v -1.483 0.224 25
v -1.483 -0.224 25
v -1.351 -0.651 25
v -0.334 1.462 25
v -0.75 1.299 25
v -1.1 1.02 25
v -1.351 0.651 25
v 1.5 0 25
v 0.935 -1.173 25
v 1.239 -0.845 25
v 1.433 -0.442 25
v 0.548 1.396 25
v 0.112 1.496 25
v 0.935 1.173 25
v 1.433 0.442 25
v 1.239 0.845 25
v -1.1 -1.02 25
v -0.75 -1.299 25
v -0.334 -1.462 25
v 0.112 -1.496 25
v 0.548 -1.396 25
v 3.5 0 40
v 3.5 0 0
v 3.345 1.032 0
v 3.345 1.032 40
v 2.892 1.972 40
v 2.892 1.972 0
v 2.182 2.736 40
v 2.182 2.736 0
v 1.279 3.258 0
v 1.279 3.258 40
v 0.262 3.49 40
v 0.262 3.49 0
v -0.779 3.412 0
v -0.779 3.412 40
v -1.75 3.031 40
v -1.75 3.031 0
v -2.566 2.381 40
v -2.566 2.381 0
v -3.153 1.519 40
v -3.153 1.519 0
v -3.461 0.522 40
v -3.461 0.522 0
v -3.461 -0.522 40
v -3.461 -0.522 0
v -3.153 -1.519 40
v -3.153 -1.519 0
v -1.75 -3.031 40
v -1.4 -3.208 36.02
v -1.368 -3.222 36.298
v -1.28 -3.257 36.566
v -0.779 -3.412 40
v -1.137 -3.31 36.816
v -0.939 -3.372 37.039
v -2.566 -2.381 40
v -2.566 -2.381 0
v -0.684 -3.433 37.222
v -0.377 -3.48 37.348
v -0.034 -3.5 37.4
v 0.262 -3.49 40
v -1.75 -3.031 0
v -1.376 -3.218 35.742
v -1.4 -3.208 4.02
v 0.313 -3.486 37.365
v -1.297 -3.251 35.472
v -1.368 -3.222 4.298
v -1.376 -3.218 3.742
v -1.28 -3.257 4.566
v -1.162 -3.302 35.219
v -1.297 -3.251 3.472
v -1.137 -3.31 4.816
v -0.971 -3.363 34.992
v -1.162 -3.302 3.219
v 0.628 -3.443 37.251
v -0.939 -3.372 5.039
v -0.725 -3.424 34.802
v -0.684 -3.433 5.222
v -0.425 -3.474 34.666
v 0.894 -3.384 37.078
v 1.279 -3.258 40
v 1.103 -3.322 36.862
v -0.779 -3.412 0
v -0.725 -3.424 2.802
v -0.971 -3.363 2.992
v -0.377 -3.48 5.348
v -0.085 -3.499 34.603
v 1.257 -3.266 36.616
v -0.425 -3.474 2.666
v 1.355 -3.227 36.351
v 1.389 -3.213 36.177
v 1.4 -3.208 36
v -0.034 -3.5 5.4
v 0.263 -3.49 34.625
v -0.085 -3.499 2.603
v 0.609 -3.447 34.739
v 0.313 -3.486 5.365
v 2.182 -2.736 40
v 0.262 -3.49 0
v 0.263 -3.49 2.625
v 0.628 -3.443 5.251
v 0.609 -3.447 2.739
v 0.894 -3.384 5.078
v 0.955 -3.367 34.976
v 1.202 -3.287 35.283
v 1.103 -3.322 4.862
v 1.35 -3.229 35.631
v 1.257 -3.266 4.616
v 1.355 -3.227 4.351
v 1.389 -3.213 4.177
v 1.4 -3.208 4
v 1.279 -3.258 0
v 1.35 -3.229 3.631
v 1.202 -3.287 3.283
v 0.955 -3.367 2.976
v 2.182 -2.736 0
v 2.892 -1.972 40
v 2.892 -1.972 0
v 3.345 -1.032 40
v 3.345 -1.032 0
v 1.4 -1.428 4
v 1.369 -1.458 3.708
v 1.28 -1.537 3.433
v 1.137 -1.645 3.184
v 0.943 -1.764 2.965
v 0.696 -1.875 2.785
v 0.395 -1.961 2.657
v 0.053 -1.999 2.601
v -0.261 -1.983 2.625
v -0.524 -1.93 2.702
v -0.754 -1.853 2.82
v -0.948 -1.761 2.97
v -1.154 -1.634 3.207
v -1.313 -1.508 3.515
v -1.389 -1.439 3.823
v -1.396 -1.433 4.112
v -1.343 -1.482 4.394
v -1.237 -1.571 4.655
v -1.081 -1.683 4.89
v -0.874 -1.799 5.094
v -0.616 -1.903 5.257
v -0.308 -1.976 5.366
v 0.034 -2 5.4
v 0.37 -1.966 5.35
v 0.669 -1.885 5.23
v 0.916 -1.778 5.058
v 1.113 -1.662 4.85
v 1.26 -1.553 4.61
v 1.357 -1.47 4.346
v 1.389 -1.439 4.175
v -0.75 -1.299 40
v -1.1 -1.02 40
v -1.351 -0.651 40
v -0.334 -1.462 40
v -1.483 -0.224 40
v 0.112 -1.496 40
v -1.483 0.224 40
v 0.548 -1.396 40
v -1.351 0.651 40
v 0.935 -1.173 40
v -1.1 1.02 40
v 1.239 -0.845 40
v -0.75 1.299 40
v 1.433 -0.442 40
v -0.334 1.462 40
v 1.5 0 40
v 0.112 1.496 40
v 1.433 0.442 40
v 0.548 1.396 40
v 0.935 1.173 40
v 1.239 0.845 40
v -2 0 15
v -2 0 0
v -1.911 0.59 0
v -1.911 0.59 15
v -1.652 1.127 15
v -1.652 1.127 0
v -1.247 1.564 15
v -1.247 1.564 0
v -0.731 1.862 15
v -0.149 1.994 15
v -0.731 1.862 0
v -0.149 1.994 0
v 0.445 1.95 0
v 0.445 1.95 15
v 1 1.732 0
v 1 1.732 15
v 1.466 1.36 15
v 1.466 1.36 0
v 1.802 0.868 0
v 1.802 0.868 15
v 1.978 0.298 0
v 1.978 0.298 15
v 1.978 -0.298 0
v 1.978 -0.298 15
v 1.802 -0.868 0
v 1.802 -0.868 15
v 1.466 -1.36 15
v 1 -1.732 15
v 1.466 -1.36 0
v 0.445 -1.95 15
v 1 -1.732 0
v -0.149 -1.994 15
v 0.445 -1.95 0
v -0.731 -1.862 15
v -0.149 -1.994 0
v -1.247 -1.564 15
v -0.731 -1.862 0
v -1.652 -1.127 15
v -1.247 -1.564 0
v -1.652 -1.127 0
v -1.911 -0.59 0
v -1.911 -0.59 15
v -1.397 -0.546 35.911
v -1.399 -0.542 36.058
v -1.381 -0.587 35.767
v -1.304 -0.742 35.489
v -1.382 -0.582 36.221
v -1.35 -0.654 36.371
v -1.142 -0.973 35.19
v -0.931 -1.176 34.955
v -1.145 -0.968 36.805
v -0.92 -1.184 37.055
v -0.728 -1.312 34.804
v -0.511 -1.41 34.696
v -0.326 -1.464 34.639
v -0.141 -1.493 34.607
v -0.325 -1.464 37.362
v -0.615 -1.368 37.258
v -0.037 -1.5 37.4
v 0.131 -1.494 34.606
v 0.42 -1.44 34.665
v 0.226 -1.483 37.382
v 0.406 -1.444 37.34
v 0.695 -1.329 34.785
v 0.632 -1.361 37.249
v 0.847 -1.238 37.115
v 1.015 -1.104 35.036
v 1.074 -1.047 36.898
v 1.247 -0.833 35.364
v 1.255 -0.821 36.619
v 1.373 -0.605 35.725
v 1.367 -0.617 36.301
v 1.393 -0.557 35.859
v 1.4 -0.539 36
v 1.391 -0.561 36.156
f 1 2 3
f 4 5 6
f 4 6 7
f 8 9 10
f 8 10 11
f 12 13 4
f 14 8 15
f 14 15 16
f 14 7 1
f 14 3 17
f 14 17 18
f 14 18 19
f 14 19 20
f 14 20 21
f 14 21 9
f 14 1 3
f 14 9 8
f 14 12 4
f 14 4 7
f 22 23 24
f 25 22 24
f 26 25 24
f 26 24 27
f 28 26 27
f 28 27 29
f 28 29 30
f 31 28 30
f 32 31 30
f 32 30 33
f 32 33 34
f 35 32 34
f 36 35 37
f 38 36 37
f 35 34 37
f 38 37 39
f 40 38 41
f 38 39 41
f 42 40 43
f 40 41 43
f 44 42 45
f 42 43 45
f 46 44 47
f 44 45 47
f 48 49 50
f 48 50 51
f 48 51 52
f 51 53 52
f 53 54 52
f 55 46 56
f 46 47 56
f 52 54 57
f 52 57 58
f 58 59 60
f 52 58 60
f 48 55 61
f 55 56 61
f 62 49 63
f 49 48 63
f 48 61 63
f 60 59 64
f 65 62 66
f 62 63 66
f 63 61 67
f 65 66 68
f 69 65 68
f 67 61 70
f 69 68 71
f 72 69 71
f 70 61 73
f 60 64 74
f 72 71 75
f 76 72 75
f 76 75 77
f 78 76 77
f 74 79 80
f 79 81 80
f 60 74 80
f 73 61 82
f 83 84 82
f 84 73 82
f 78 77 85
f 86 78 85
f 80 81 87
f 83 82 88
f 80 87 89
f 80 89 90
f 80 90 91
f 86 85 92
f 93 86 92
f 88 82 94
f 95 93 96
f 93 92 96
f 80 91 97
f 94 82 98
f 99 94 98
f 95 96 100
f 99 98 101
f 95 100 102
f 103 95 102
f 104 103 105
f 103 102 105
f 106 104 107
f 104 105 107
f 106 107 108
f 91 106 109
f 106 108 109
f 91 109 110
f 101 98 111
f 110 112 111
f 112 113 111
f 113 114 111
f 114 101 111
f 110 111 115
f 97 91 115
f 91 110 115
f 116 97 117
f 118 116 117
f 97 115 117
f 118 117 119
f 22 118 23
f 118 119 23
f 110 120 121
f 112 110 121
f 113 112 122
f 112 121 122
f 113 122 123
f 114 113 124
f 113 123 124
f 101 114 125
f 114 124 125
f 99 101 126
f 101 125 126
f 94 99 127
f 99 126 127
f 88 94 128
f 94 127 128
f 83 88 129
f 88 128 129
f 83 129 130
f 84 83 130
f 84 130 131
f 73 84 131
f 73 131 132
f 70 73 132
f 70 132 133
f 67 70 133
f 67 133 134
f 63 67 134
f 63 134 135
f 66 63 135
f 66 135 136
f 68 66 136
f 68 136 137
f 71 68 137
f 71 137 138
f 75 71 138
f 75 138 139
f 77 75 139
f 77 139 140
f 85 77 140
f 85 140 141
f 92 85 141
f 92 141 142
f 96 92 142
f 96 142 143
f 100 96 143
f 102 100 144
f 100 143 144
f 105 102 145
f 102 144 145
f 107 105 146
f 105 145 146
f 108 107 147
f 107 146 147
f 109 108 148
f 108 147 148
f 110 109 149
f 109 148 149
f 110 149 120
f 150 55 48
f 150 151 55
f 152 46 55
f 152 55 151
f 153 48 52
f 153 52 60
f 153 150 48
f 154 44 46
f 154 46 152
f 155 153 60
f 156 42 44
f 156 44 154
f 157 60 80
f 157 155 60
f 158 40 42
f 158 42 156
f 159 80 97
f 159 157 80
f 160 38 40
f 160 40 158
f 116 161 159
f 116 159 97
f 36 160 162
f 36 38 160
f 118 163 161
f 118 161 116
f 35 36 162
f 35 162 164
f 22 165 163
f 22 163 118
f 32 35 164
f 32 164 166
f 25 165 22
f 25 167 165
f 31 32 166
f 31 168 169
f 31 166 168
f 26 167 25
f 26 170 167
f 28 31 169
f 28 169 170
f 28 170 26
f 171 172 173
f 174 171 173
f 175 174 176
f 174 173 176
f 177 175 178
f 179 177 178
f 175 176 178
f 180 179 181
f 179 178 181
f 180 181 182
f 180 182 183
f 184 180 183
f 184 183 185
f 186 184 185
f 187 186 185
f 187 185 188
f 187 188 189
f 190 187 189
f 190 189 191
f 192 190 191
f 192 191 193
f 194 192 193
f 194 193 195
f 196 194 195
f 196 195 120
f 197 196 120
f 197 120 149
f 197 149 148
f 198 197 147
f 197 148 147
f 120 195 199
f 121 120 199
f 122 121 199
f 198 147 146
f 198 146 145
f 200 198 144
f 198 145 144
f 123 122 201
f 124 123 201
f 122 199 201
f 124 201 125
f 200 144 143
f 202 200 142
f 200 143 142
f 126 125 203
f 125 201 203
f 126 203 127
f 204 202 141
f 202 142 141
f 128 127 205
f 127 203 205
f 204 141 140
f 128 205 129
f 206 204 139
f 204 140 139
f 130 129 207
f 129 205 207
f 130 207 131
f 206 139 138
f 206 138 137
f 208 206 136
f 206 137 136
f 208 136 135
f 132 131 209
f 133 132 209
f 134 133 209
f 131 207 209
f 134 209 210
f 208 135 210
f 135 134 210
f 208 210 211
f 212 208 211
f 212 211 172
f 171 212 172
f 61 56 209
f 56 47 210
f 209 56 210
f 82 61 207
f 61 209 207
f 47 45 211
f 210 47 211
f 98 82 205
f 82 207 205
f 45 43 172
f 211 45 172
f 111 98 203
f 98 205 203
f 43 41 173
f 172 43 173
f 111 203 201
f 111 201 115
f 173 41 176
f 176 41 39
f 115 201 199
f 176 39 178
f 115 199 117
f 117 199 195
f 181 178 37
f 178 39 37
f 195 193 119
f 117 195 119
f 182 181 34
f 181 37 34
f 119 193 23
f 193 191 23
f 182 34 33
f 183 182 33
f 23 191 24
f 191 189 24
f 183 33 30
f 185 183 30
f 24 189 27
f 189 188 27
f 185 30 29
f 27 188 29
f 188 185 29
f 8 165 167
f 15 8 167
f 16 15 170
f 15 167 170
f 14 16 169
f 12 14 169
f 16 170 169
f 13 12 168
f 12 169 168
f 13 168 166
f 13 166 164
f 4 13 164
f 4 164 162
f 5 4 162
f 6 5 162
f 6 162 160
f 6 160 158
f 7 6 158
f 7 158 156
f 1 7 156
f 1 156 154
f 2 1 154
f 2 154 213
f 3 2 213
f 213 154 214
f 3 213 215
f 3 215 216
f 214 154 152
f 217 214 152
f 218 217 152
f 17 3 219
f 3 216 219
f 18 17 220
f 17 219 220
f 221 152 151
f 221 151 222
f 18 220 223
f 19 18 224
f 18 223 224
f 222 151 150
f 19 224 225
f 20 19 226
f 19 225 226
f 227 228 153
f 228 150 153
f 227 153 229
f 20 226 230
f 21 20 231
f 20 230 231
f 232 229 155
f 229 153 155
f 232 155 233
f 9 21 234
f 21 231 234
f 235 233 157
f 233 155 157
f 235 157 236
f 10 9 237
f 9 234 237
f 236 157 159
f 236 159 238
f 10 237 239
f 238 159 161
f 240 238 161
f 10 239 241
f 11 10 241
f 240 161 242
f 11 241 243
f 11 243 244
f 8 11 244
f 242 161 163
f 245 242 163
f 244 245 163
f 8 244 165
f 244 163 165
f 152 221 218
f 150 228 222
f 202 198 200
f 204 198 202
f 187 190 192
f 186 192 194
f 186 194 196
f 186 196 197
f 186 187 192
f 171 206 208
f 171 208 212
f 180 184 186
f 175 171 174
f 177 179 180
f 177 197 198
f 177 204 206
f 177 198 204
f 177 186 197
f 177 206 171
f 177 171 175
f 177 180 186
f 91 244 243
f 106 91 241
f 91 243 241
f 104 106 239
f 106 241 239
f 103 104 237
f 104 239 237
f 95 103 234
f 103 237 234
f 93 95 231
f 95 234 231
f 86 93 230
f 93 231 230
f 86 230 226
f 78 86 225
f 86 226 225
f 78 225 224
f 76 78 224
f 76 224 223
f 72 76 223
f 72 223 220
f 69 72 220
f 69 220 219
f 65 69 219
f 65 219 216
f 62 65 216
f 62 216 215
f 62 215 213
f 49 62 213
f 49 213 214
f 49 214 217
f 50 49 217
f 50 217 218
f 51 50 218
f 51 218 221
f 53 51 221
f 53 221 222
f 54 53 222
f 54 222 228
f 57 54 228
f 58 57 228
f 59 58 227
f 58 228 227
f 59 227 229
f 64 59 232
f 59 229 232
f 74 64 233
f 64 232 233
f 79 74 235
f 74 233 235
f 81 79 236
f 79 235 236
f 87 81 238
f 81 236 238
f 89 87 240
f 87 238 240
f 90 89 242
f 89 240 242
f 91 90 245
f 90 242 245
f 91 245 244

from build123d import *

# Parameters (mm, degrees)
CROQUIS1_R              = 3.5
SALIENTE_EXTRUIR1_DEPTH = 40
CROQUIS2_R              = 1.5
CORTAR_EXTRUIR1_DEPTH   = 15
CROQUIS3_R              = 2
CORTAR_EXTRUIR2_DEPTH   = 15
CROQUIS4_R              = 1.4
CORTAR_EXTRUIR3_DEPTH   = 4.5


with BuildPart() as part:
    # Croquis1 → Saliente-Extruir1 (new body)
    with BuildSketch(Plane.XY):
        Circle(CROQUIS1_R)
    extrude(amount=SALIENTE_EXTRUIR1_DEPTH)

    # Croquis2 → Cortar-Extruir1 (cut)
    with BuildSketch(Plane.XY.offset(40)):
        Circle(CROQUIS2_R)
    extrude(amount=-CORTAR_EXTRUIR1_DEPTH, mode=Mode.SUBTRACT)

    # Croquis3 → Cortar-Extruir2 (cut)
    with BuildSketch(Plane(origin=(0, 0, 0), x_dir=(-1, 0, 0), z_dir=(0, 0, -1))):
        Circle(CROQUIS3_R)
    extrude(amount=-CORTAR_EXTRUIR2_DEPTH, mode=Mode.SUBTRACT)

    # Croquis4 → Cortar-Extruir3 (cut, through all)
    with BuildSketch(Plane(origin=(0, 0, 0), x_dir=(1, 0, 0), z_dir=(0, 1, 0))):
        with Locations((0, -4)):
            Circle(CROQUIS4_R)
        with Locations((0, -36)):
            Circle(CROQUIS4_R)
    extrude(amount=-CORTAR_EXTRUIR3_DEPTH, mode=Mode.SUBTRACT)


solid = part.part
